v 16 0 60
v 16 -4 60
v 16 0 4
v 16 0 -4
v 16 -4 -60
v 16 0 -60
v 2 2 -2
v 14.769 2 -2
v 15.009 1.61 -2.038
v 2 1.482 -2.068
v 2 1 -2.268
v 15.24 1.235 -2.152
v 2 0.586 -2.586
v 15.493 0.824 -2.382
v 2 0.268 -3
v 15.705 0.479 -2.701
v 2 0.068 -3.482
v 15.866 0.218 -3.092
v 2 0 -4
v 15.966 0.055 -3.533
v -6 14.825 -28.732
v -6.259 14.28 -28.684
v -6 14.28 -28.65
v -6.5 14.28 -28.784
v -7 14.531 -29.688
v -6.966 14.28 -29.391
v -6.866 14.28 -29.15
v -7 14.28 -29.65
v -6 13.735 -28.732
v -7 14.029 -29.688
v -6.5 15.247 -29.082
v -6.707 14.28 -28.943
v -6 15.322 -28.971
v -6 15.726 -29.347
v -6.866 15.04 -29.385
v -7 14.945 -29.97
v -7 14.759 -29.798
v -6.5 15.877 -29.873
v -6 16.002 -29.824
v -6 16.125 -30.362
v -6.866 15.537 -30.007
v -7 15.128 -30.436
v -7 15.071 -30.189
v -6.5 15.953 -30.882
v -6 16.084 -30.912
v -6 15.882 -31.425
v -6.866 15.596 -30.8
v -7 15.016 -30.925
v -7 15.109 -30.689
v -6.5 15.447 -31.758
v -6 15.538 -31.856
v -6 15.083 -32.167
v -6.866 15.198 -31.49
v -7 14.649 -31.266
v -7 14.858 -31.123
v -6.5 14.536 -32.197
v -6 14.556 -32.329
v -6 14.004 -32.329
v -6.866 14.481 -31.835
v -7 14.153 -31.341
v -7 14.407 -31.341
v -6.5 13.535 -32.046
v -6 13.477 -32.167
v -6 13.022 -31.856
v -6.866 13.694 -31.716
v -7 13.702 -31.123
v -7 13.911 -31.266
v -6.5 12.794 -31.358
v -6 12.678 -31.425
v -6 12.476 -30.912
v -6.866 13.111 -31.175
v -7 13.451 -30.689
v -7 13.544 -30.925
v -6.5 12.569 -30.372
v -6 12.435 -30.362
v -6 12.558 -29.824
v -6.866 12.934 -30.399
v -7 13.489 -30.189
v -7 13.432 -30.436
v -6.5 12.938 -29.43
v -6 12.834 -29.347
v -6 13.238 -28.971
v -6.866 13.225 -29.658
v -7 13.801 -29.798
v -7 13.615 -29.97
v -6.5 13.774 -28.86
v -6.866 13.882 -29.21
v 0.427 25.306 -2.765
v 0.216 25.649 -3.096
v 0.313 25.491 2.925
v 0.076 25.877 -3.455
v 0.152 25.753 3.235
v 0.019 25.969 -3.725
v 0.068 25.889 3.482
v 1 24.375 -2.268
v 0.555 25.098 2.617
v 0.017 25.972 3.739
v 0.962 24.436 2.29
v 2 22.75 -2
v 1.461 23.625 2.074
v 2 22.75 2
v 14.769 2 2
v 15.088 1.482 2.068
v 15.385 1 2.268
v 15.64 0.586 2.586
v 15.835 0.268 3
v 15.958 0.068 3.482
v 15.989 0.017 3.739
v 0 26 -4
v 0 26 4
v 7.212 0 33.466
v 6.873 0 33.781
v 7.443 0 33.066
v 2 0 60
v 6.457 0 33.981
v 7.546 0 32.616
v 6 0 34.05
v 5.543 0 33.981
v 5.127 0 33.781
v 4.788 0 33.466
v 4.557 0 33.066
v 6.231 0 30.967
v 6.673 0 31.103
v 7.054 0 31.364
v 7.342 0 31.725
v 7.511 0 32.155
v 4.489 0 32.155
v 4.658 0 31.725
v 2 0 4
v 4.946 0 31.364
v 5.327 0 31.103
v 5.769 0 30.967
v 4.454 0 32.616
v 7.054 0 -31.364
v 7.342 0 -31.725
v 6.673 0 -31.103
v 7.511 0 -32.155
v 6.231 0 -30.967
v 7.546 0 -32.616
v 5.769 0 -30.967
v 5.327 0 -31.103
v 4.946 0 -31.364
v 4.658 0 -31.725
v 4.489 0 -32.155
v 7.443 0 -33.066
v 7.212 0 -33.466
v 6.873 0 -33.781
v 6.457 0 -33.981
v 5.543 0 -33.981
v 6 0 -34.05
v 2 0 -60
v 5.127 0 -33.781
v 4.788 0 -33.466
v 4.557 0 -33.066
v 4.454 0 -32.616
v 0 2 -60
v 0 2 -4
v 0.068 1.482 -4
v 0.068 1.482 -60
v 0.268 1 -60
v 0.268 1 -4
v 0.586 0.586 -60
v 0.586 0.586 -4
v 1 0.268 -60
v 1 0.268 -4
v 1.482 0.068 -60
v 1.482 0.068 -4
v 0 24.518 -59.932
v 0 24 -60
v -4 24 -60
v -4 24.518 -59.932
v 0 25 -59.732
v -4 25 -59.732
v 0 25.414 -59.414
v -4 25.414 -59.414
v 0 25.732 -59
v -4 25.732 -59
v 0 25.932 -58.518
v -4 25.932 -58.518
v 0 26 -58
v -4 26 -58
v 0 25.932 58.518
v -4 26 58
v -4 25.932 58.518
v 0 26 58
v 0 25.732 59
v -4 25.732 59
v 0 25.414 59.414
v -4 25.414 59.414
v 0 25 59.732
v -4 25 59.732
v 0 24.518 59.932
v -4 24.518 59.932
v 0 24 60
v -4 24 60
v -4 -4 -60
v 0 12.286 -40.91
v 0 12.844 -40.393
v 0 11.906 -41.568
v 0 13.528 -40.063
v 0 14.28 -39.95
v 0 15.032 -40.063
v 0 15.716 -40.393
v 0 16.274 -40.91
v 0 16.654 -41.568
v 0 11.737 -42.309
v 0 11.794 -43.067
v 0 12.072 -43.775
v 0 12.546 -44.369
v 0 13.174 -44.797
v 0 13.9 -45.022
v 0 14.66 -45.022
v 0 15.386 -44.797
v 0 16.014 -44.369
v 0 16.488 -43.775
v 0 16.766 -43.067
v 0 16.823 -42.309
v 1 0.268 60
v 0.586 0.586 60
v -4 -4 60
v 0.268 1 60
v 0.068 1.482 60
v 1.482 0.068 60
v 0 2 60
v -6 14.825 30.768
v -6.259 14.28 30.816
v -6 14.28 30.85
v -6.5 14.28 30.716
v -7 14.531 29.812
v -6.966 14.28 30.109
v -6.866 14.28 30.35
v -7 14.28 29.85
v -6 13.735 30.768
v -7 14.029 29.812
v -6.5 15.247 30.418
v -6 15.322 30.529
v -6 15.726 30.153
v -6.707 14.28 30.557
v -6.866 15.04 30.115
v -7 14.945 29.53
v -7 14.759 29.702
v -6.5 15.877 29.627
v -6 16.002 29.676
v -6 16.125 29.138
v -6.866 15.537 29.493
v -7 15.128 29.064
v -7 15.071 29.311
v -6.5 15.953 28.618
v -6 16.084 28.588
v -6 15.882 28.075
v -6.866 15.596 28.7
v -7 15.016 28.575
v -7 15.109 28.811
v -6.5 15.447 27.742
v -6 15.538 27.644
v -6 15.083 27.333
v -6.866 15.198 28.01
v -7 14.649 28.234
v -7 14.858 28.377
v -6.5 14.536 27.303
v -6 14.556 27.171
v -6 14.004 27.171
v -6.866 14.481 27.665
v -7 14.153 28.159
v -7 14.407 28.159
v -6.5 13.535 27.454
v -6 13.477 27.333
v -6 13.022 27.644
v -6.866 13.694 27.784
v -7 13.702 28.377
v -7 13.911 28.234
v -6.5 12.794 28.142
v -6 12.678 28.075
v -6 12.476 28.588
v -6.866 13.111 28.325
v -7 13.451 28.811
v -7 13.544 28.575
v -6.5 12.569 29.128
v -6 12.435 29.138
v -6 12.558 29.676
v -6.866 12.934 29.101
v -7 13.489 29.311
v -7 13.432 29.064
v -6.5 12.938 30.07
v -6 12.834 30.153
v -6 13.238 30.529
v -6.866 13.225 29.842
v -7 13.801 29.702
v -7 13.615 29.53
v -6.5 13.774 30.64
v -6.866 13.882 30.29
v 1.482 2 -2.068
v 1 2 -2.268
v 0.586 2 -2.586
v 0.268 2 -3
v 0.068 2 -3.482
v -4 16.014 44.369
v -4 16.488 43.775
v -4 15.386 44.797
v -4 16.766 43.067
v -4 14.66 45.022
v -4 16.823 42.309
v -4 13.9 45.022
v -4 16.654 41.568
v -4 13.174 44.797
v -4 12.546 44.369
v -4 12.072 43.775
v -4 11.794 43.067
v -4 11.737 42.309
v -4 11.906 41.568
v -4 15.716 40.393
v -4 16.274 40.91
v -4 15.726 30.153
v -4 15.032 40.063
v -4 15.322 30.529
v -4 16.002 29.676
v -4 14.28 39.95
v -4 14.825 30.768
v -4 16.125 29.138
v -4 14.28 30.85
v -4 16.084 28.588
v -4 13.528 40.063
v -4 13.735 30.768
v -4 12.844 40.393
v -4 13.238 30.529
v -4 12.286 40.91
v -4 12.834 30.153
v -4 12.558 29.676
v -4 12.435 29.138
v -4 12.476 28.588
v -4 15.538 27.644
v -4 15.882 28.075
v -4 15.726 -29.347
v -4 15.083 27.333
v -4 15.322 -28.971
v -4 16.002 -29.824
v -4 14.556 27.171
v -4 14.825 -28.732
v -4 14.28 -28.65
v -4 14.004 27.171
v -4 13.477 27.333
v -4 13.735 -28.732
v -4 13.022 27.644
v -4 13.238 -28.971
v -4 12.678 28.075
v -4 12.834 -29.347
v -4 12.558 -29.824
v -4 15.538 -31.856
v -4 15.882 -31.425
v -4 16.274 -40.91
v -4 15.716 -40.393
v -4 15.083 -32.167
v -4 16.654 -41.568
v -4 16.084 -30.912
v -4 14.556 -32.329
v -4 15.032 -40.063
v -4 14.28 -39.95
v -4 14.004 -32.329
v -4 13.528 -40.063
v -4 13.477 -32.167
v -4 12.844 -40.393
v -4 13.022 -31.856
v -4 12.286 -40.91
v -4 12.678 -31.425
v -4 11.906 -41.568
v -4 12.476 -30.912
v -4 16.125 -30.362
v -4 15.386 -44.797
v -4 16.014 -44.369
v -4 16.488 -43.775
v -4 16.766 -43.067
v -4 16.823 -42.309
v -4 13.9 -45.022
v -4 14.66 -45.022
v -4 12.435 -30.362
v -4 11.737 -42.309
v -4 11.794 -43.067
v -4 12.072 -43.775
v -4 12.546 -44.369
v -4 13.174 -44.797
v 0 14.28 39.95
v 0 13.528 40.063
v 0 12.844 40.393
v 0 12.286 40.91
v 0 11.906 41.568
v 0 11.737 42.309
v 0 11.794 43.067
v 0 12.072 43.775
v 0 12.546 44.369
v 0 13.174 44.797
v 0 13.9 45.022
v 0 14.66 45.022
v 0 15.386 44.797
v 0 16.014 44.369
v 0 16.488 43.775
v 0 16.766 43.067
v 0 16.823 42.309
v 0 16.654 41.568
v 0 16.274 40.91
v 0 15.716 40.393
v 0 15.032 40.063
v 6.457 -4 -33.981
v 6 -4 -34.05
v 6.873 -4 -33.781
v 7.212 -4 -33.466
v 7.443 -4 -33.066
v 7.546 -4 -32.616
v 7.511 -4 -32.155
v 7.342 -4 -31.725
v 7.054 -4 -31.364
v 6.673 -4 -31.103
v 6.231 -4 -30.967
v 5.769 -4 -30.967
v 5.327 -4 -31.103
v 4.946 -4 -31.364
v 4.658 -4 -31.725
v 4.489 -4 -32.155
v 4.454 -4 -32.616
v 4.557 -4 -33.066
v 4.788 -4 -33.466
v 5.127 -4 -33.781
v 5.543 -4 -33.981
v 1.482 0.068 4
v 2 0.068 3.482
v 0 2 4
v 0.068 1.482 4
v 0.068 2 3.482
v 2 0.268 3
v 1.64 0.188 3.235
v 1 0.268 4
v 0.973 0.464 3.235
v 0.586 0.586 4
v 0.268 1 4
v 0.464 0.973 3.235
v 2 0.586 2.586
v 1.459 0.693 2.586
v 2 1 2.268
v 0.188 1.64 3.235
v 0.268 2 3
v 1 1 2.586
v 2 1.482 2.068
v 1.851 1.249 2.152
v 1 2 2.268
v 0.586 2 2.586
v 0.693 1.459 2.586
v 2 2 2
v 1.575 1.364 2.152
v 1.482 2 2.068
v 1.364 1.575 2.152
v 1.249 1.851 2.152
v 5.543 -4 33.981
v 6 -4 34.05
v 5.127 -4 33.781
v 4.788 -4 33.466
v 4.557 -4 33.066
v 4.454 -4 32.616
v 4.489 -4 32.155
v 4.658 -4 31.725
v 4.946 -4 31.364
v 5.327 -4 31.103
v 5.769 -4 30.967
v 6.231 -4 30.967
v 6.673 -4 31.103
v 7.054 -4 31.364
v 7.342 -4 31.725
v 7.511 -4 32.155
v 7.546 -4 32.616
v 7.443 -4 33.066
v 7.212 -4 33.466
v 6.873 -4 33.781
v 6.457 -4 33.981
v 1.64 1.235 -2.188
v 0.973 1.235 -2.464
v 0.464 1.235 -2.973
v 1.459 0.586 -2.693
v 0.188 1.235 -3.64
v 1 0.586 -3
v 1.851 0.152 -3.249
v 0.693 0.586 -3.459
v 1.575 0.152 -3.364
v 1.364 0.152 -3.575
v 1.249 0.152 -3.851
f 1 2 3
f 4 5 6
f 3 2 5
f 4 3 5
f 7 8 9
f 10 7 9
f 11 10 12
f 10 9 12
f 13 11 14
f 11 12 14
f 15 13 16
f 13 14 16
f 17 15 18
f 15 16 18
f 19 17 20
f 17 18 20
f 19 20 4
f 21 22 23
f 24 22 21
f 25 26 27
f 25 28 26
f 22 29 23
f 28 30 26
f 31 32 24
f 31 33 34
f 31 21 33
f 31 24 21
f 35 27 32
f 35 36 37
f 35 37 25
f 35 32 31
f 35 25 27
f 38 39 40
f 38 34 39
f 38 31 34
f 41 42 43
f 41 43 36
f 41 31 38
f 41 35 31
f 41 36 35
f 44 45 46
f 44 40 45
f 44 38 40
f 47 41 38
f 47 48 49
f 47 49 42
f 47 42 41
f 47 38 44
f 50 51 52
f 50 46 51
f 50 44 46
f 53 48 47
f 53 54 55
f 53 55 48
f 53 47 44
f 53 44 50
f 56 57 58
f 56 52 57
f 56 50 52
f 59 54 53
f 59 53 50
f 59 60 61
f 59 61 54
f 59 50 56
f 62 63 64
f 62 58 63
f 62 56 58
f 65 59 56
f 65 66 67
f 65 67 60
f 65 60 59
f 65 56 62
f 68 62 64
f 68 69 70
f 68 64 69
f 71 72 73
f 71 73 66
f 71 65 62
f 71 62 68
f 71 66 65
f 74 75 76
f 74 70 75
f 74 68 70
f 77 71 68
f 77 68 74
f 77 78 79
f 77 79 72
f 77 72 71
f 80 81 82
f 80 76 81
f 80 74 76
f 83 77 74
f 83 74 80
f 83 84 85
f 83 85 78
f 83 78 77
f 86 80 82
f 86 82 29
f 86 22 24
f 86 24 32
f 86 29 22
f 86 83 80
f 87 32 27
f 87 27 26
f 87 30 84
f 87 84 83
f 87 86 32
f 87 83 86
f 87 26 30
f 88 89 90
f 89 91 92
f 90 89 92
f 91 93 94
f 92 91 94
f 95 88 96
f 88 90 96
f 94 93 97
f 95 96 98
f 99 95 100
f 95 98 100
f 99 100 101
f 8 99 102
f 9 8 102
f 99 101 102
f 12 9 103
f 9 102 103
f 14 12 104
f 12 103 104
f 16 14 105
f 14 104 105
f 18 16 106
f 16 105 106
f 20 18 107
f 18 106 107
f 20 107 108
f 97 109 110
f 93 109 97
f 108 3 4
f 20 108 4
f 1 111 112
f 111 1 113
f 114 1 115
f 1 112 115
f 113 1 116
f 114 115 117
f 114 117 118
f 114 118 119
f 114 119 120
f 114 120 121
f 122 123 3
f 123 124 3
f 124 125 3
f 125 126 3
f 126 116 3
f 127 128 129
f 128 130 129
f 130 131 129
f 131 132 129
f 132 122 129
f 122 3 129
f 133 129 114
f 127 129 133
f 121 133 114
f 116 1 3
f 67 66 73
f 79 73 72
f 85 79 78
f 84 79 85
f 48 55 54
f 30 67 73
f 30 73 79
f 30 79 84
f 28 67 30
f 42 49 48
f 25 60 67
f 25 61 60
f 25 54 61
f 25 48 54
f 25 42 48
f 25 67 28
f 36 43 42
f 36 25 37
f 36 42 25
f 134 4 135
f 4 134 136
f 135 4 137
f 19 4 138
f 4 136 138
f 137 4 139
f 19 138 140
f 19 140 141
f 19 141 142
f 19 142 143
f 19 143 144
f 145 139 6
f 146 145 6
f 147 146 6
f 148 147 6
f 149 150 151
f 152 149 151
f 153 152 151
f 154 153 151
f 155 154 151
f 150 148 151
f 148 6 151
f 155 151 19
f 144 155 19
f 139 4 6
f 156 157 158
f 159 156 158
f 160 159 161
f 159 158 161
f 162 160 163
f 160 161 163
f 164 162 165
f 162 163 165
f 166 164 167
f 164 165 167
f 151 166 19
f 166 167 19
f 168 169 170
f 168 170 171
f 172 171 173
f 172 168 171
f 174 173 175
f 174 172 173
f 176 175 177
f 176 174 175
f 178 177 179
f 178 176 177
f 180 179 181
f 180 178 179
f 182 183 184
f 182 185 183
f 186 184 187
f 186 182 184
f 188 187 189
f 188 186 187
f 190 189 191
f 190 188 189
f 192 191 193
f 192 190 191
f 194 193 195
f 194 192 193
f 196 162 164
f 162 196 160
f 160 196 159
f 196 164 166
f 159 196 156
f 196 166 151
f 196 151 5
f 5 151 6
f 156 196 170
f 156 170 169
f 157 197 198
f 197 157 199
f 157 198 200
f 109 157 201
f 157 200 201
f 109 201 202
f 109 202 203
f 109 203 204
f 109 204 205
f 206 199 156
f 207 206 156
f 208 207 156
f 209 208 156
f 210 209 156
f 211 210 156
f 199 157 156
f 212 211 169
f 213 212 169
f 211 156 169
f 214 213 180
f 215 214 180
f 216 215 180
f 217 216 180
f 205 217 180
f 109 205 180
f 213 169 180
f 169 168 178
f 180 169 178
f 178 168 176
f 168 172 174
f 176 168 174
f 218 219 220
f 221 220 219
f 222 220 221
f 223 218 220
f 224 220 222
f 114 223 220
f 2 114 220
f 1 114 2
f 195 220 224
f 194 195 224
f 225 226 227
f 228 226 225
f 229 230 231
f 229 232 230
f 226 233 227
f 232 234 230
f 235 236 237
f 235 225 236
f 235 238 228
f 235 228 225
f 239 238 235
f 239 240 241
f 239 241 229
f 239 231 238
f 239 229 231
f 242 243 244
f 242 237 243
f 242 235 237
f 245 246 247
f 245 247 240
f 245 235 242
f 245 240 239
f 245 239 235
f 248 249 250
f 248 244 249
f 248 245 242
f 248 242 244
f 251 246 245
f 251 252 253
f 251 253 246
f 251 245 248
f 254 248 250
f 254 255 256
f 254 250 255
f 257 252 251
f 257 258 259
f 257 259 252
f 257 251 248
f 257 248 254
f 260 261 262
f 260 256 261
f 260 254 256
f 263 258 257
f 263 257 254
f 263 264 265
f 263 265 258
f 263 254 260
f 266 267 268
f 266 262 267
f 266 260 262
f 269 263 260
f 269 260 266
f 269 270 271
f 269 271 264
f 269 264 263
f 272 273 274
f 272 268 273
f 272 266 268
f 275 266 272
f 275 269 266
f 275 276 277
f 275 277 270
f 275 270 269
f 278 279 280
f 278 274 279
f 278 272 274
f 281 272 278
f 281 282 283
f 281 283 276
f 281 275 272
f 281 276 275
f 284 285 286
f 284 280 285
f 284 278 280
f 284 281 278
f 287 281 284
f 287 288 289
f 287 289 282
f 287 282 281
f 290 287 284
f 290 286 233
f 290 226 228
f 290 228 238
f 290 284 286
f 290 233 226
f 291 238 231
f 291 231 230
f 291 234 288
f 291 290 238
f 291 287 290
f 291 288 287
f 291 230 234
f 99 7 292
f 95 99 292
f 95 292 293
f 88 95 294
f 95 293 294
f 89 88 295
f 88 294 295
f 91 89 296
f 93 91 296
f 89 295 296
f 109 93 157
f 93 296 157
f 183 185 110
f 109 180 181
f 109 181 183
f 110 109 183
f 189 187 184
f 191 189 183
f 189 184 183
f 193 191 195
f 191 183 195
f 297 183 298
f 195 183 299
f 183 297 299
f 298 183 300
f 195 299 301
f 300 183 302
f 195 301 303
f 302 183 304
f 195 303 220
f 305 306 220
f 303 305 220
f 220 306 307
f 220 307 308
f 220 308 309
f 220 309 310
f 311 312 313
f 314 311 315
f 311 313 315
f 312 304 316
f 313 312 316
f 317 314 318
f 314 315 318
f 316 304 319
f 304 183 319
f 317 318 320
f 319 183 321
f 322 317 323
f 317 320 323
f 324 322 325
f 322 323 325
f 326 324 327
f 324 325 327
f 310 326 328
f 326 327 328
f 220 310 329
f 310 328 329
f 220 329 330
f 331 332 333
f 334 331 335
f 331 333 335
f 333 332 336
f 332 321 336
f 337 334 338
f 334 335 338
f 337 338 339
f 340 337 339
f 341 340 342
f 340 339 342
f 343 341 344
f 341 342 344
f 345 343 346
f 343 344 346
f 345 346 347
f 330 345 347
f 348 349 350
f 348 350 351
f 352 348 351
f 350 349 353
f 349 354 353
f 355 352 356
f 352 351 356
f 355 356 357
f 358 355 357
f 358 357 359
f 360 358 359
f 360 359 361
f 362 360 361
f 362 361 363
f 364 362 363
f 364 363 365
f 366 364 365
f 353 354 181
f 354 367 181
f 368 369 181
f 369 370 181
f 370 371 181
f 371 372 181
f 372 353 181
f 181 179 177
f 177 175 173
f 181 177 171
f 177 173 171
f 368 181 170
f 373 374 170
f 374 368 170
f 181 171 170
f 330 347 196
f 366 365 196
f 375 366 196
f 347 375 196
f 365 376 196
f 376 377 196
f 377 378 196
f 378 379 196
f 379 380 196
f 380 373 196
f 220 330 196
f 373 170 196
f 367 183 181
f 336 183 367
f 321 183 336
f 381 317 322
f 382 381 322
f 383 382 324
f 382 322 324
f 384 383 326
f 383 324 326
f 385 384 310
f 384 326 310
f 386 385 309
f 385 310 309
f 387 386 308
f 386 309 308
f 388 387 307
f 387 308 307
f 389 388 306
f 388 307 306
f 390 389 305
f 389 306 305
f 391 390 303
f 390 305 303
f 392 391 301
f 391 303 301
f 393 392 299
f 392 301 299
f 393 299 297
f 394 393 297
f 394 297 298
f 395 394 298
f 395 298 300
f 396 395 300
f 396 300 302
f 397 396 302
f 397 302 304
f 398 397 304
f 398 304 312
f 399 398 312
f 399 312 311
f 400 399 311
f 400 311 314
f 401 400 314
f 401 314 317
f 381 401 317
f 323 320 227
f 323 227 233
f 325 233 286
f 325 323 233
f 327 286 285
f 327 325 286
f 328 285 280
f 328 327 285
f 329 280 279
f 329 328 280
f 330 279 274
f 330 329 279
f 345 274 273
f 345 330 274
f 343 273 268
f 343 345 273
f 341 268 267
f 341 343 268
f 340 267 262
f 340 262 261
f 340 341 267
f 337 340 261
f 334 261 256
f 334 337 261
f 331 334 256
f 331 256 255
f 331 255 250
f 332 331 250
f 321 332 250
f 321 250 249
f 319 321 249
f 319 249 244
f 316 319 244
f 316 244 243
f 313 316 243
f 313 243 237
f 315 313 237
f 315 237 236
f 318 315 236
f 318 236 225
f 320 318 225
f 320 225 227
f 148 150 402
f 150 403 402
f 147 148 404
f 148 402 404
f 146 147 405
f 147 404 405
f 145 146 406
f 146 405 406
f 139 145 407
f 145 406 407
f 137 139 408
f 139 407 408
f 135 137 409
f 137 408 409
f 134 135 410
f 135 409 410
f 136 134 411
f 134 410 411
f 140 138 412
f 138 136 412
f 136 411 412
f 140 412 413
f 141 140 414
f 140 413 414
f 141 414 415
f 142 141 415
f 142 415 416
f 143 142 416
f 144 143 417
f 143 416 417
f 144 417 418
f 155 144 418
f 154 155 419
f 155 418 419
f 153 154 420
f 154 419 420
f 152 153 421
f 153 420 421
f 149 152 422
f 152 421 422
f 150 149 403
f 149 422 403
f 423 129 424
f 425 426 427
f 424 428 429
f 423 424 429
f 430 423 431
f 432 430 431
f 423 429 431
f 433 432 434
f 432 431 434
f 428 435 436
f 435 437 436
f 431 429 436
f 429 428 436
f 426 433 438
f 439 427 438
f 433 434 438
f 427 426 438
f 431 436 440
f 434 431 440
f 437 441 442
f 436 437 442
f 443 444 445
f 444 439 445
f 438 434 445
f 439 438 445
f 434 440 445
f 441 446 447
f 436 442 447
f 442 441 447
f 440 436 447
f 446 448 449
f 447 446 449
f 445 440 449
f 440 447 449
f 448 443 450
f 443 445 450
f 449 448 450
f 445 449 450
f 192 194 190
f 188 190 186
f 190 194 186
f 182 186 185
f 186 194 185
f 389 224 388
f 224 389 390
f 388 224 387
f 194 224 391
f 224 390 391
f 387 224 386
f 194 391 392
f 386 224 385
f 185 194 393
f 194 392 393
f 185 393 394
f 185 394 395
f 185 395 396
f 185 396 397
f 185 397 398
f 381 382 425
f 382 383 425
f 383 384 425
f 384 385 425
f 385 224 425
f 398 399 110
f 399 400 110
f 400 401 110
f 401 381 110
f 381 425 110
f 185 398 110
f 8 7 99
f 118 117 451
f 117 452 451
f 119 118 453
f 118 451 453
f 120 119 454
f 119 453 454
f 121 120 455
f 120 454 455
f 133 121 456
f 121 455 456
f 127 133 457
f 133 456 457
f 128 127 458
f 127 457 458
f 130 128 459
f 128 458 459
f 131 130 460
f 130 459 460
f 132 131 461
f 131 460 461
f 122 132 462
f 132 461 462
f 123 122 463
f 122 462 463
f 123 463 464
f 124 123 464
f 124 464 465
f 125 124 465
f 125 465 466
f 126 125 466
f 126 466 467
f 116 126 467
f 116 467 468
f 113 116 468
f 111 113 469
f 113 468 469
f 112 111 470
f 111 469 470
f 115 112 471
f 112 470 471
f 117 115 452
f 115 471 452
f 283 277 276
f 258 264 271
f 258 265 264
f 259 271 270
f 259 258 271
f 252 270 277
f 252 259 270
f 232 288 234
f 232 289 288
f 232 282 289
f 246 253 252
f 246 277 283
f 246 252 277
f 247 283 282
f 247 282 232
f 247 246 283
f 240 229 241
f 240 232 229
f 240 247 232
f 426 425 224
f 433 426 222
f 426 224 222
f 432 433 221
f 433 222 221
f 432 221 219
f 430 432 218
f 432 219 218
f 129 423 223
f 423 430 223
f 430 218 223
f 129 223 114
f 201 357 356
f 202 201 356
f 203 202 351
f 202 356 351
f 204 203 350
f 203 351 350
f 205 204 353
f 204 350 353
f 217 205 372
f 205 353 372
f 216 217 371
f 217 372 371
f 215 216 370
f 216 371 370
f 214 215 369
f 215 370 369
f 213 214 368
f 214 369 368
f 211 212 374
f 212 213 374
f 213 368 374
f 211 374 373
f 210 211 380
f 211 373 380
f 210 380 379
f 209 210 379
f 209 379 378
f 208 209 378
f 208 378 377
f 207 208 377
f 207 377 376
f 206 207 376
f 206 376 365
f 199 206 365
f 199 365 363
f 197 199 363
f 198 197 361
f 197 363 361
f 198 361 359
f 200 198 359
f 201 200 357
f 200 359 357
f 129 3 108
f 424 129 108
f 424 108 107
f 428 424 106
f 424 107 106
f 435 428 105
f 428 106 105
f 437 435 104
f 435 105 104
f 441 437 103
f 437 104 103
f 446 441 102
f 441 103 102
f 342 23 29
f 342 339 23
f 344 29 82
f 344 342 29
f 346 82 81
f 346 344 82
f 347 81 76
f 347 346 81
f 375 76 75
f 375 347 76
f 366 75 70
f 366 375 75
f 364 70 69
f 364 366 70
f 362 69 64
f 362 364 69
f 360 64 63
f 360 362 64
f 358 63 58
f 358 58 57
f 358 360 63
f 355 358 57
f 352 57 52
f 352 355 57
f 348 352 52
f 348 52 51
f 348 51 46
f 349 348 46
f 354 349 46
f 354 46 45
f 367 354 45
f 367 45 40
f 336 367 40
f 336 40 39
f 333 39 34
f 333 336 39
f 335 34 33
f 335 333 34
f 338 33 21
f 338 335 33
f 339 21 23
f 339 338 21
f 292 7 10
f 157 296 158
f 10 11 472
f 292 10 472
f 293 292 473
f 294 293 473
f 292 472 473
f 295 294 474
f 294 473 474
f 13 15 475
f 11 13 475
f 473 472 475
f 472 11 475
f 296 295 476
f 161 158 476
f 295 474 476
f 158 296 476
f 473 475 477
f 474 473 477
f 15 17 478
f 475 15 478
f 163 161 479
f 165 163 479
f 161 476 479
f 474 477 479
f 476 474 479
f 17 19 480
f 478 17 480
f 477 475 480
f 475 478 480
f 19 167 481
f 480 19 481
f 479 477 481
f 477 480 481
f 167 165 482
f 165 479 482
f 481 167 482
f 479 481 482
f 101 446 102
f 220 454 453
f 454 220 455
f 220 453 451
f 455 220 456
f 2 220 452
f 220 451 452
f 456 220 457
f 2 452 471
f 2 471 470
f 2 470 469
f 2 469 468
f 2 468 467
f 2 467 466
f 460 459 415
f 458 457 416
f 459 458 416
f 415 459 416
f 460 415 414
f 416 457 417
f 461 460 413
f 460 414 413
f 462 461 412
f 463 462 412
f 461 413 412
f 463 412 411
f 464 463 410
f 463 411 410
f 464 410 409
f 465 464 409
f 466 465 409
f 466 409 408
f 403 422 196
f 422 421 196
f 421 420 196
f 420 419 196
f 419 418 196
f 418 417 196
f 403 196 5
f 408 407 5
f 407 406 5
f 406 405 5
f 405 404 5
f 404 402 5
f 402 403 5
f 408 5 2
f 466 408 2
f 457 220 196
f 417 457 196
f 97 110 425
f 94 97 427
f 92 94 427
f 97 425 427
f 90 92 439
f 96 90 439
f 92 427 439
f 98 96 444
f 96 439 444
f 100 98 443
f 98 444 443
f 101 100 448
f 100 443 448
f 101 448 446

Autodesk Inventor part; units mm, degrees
ref_plane "YZ Plane" through (0, 0, 0) normal (1, 0, 0) x (0, 1, 0)
ref_plane "XZ Plane" through (0, 0, 0) normal (0, 1, 0) x (-1, 0, 0)
ref_plane "XY Plane" through (0, 0, 0) normal (0, 0, 1) x (1, 0, 0)
sketch "Sketch1" plane through (0, 0, 0) normal (0, 0, 1) x (1, 0, 0)
  line L0 (-4, 26) -> (-4, -4)
  line L1 (-4, -4) -> (16, -4)
  line L2 (16, -4) -> (16, 0)
  line L3 (16, 0) -> (0, 0)
  line L4 (0, 0) -> (0, 26)
  line L5 (0, 26) -> (-4, 26)
  point P0 (0, 0)
  dimension "d0" = 30
  dimension "d1" = 20
  dimension "d2" = 4
  dimension "d3" = 4
extrude "Extrusion1" add sketch "Sketch1" along normal mid plane 120
sketch "Sketch2" plane through (0, 0, 0) normal (0, 0, 1) x (1, 0, 0)
  line L0 (0, 0) -> (0, 26) projected
  line L1 (16, -4) -> (16, 0) projected
  line L2 (0, 26) -> (16, 0)
  line L3 (16, 0) -> (0, 0)
extrude "Extrusion2" add sketch "Sketch2" along normal mid plane 4
fillet "Fillet1" radius 2 8 edges at (0, 0, 31) (0, 0, -31) (0, 13, 2) (8, 0, 2) (0, 13, -2) (8, 0, -2) (-2, 26, 60) (-2, 26, -60)
sketch "Sketch3" plane through (0, 2, 4) normal (1, 0, 0) x (0, 0, -1)
  line L0 (64, -6) -> (-56, -6) projected
  line L1 (8, 24) -> (0, 24) projected
  point P0 (4, -2)
  point P1 (-38.5, 12.28)
  point P2 (4, 24)
  dimension "d19" = 18.28
  dimension "d20" = 42.5
hole "Hole1" at (0, 14.28, 42.5) direction (-1, 0, 0) diameter 5.1 depth 4
mirror "Mirror1" about plane through (0, 0, 0) normal (0, 0, 1) of "Hole1"
sketch "Sketch4" plane through (2, 0, 4) normal (0, 1, 0) x (1, 0, 0)
  line L0 (14, 0) -> (14, -56) projected
  line L1 (14, 8) -> (14, 0) projected
  point P0 (-2, 4)
  point P1 (4, -28.5)
  point P2 (14, -50)
  point P3 (14, 4)
  dimension "d28" = 10
  dimension "d29" = 32.5
hole "Hole2" at (6, 0, 32.5) direction (0, -1, 0) diameter 3.1 depth 4
mirror "Mirror2" about plane through (0, 0, 0) normal (0, 0, 1) of "Hole2"
sketch "Sketch5" plane through (-4, -4, -60) normal (-1, 0, 0) x (0, 0, 1)
  circle A0 centre (89, 18.28) radius 1.85
  line L0 (144, 18.28) -> (-24, 18.28) projected
  line L1 (120, 28) -> (120, 0) projected
  circle A1 centre (29.5, 18.28) radius 1.85
  circle A2 centre (17.5, 18.28) radius 2.55 projected
  point P0 (60, 4)
  dimension "d31" = 3.7
  dimension "d32" = 31
  dimension "d33" = 3.7
  dimension "d34" = 12
extrude "Extrusion3" add sketch "Sketch5" along normal blind 3 contours L0 A0 | A0 L0 | A1 L0 | L0 A1
fillet "Fillet2" radius 1 2 edges at (-7, 14.28, -32.35) (-7, 14.28, 27.15)
properties part number "LV_Bracket_2"
